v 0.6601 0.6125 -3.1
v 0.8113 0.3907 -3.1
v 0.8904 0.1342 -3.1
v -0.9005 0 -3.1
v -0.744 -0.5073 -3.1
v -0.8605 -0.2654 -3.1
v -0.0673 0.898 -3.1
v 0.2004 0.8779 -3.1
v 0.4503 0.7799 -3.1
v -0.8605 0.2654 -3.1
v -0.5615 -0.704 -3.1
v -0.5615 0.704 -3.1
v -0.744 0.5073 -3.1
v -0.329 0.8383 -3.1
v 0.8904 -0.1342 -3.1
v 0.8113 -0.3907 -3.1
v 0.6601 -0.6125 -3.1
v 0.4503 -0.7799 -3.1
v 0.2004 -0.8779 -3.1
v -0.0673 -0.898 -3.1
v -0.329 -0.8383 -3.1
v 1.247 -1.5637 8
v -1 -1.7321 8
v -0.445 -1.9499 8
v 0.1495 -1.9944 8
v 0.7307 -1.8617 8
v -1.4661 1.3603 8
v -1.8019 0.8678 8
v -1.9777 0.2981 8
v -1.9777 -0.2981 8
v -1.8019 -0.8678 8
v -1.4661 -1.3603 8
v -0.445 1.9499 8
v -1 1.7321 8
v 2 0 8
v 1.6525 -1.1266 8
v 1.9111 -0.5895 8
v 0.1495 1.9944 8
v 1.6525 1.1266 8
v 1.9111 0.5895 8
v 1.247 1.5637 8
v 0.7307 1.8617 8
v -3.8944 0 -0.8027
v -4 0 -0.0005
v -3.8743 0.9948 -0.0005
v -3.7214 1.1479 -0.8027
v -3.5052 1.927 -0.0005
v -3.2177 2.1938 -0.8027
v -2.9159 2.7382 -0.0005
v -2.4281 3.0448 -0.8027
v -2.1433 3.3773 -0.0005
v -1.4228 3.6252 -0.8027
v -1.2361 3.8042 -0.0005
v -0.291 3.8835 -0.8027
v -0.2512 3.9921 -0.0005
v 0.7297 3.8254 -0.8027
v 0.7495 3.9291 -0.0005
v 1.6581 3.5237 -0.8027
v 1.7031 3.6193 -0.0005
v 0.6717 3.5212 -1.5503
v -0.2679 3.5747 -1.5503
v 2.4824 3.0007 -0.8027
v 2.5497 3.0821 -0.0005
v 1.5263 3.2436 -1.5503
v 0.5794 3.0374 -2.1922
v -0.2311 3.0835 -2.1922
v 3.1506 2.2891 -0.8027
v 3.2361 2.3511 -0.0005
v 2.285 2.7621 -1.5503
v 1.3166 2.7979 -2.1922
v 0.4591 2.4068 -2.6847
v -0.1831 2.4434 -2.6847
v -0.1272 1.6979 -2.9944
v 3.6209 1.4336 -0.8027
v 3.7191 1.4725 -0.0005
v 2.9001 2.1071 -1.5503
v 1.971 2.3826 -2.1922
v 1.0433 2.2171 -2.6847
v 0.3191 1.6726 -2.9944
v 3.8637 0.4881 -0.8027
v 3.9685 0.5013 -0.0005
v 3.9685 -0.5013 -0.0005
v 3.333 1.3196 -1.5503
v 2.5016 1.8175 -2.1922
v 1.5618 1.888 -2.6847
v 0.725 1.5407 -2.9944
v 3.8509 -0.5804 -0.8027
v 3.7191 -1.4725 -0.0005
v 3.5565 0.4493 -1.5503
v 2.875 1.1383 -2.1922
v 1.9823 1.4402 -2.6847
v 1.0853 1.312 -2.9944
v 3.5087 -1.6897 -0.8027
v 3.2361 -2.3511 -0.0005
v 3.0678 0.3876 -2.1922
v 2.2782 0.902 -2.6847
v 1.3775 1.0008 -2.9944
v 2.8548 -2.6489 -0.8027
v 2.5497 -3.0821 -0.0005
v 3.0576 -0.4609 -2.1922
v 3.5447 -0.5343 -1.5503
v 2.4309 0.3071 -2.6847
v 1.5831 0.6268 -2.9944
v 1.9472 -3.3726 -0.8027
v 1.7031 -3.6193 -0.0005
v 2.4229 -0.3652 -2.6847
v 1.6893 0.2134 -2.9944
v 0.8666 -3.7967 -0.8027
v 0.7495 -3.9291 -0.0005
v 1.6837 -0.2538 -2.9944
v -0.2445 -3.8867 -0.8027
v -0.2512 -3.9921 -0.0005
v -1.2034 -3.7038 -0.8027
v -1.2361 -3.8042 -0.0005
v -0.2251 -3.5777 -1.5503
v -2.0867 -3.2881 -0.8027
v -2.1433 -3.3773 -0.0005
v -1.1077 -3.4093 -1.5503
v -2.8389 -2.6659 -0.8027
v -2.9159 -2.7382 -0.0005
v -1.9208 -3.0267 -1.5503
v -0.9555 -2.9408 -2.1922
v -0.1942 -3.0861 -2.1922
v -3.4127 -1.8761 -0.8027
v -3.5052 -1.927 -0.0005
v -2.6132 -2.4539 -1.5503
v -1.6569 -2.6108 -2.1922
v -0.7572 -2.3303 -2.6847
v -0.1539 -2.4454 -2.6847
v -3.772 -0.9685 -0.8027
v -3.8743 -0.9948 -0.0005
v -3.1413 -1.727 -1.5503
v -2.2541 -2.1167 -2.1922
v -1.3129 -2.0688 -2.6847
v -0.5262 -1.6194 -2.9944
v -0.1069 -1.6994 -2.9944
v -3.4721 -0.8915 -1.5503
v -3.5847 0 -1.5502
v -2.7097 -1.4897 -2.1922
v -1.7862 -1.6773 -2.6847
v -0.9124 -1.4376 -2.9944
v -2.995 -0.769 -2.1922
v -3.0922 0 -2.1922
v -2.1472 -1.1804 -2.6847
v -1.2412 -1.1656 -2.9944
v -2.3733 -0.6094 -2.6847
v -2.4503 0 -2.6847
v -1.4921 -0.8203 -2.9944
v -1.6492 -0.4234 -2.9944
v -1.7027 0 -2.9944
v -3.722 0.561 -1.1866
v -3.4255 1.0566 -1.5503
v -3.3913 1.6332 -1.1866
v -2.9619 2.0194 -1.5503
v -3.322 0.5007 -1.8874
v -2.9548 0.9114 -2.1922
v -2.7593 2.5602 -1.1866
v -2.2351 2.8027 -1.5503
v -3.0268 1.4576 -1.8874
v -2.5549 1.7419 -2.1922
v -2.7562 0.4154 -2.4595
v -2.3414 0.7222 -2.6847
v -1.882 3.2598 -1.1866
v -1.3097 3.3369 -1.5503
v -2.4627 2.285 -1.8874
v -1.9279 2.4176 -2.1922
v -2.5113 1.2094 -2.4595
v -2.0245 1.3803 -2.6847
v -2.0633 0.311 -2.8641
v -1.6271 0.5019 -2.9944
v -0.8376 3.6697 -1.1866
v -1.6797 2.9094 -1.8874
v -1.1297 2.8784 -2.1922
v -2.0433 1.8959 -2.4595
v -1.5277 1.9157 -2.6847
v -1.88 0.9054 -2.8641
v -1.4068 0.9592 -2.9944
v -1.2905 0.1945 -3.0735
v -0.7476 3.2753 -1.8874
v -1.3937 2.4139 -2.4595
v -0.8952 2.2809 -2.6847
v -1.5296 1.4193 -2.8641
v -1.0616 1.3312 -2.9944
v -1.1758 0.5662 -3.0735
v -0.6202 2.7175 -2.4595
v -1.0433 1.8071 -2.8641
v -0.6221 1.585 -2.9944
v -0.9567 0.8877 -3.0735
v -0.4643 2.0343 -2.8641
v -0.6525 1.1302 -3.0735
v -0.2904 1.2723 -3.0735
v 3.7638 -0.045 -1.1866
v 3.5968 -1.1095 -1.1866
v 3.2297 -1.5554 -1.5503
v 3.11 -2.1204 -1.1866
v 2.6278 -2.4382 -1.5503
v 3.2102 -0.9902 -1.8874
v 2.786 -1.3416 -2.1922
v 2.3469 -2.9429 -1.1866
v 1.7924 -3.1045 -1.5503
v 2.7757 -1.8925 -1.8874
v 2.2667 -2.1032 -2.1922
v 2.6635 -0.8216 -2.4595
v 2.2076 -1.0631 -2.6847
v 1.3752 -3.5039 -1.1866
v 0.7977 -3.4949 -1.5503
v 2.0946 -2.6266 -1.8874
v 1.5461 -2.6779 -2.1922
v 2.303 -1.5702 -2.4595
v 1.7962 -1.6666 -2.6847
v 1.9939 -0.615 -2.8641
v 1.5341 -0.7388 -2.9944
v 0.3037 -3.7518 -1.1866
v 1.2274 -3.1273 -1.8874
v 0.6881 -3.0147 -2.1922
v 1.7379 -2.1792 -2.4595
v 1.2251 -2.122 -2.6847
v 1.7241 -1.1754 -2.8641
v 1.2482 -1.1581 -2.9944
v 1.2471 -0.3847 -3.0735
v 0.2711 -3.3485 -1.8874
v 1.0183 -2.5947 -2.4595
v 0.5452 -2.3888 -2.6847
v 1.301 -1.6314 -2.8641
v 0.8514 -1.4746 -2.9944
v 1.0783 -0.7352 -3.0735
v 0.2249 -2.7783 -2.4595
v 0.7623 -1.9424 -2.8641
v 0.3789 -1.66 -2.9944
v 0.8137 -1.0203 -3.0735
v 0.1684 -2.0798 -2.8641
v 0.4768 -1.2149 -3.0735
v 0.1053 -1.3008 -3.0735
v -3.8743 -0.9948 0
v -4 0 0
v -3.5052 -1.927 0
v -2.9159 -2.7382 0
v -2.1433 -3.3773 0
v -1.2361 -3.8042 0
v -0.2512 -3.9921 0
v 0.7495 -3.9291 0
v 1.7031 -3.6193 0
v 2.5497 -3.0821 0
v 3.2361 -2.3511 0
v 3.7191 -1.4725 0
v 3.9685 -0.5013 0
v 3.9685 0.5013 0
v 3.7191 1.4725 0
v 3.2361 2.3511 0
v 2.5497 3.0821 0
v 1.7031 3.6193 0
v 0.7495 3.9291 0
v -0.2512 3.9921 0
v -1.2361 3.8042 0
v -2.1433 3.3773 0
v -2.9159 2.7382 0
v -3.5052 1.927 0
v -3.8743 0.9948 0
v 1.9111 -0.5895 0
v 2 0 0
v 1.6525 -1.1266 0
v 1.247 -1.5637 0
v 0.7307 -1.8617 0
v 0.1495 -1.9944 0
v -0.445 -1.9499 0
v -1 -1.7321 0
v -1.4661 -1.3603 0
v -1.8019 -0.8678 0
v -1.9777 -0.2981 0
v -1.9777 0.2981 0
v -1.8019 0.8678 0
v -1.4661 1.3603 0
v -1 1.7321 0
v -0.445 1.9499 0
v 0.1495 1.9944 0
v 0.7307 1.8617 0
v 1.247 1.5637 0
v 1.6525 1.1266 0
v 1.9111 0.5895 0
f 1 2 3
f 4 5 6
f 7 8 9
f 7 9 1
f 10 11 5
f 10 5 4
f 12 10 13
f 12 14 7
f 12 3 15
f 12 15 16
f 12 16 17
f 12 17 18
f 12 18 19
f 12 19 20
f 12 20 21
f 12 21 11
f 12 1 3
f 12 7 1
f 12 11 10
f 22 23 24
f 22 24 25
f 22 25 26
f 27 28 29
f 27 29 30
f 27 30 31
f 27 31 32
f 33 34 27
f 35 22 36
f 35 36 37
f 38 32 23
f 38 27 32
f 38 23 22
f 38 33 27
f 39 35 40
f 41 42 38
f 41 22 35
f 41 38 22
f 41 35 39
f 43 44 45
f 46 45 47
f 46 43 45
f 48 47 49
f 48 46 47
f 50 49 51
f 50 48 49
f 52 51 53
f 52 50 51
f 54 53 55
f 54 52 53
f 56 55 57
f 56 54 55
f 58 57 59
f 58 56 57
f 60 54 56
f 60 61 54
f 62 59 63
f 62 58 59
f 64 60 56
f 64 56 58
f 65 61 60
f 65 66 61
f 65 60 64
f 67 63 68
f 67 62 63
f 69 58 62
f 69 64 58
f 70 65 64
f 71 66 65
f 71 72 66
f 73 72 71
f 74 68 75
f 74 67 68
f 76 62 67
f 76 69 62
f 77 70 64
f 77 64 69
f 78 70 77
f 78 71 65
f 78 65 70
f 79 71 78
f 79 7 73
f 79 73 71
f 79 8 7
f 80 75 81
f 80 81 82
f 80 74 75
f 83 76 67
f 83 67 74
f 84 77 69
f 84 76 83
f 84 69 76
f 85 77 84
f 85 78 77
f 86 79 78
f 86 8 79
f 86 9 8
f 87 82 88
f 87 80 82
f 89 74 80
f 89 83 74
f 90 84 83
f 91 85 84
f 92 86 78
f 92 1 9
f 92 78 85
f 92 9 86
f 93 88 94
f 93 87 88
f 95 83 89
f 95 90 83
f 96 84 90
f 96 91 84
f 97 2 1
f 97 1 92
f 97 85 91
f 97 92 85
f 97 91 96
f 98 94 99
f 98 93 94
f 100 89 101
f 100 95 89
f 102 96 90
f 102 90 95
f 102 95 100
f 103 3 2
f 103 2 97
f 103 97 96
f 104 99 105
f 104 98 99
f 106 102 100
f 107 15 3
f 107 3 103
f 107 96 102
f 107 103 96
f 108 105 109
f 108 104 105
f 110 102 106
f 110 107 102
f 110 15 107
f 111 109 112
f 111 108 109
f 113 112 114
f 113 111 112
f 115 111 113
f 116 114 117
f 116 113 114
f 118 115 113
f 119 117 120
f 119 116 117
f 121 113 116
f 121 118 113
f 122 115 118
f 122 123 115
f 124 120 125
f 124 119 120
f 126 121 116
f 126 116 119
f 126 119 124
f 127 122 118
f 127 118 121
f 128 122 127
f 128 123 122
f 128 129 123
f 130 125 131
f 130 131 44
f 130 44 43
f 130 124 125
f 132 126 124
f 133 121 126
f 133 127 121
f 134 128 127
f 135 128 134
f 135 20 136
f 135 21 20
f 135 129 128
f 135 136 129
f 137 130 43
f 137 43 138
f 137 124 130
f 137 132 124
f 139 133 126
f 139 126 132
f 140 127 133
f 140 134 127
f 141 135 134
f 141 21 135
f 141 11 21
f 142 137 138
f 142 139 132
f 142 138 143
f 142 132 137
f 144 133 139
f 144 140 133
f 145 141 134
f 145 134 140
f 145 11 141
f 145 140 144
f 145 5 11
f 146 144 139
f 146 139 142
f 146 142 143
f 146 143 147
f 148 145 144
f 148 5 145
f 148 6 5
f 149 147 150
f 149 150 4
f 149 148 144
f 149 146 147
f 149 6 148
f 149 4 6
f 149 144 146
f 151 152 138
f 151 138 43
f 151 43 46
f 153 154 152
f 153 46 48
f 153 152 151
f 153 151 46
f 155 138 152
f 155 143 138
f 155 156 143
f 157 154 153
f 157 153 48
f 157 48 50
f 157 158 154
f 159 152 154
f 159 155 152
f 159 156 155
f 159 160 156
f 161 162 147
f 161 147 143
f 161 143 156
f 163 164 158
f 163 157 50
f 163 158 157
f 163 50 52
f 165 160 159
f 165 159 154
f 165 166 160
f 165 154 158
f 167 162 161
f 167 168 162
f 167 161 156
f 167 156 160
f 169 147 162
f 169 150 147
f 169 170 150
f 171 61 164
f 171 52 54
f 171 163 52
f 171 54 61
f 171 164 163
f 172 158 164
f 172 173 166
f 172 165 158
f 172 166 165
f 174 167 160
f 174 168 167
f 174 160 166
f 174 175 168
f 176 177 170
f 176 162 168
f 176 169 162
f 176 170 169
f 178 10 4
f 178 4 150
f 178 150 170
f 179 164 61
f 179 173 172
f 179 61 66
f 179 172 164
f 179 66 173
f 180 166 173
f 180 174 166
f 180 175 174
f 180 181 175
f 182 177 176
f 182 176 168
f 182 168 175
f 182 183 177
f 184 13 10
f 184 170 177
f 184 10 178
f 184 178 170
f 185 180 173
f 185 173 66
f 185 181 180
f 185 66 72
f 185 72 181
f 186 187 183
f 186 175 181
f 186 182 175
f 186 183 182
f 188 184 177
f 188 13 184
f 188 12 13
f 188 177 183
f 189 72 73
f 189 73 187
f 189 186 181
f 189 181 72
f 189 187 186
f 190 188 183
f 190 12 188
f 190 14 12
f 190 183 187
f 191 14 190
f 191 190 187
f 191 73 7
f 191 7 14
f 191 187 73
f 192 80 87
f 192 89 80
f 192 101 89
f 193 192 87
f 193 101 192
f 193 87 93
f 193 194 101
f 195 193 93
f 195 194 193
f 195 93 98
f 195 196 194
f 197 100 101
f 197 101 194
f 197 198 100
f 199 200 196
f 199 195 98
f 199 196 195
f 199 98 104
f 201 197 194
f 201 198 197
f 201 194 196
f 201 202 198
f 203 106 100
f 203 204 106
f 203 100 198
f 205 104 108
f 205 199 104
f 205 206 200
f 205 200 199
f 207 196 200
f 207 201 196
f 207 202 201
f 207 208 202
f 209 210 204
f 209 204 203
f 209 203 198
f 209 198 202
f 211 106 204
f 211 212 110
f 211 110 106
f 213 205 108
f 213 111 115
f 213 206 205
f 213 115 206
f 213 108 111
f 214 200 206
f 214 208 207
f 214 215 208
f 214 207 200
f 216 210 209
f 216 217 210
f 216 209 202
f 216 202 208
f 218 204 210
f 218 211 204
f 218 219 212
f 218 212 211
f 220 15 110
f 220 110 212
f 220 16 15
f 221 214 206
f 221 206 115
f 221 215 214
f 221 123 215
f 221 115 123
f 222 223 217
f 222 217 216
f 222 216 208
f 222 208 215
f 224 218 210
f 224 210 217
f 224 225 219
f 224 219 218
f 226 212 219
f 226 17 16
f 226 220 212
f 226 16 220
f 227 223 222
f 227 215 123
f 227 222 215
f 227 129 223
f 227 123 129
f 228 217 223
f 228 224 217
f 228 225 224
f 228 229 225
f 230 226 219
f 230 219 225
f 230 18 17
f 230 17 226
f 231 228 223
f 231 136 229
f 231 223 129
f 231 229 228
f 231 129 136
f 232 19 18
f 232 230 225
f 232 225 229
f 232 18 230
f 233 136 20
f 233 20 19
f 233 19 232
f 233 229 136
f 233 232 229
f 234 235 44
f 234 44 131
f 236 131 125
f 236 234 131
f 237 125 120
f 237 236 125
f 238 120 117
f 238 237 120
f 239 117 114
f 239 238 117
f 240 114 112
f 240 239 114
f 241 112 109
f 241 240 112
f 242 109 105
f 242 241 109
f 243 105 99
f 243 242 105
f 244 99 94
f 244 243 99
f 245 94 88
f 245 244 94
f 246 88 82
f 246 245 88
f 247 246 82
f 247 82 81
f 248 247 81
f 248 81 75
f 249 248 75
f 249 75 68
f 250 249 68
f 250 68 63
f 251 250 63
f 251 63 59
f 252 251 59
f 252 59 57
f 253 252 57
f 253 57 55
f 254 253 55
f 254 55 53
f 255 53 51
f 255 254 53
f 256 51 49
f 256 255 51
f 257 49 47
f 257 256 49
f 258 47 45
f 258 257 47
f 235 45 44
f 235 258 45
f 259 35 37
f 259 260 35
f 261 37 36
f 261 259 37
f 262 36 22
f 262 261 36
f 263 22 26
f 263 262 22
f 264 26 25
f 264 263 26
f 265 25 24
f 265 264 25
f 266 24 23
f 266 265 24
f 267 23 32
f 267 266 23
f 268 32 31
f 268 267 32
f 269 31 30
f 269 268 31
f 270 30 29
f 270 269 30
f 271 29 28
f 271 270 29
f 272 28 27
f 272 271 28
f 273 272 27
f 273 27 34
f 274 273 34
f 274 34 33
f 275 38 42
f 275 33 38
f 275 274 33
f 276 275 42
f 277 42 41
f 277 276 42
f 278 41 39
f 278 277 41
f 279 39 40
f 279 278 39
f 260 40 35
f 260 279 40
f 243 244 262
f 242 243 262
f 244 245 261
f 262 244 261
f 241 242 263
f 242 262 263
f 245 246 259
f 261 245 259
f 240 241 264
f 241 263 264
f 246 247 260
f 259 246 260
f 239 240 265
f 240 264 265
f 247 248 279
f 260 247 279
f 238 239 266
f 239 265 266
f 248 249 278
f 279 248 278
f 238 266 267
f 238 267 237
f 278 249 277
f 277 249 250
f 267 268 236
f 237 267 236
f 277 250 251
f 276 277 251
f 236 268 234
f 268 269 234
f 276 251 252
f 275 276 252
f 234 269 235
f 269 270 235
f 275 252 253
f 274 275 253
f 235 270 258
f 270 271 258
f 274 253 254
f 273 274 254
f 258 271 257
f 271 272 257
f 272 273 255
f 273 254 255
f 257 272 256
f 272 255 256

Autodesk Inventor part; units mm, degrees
ref_plane "YZ Plane" through (0, 0, 0) normal (1, 0, 0) x (0, 1, 0)
ref_plane "XZ Plane" through (0, 0, 0) normal (0, 1, 0) x (-1, 0, 0)
ref_plane "XY Plane" through (0, 0, 0) normal (0, 0, 1) x (1, 0, 0)
sketch "スケッチ1" plane through (0, 0, 0) normal (0, 0, 1) x (1, 0, 0)
  circle A0 centre (0, 0) radius 2
  dimension "d1" = 4
extrude "押し出し1" add sketch "スケッチ1" along normal blind 8
sketch "スケッチ2" plane through (0, 0, 0) normal (0, 0, -1) x (-1, 0, 0)
  circle A0 centre (0, 0) radius 2 projected
  circle A1 centre (0, 0) radius 4
  dimension "d4" = 8
extrude "押し出し2" add sketch "スケッチ2" along normal blind 3.1 contours A0 | A1
fillet "フィレット1" radius 3.1 1 edges at (4, 0, -3.1)
thread "ねじ1" size "M4x0.7" class "6g" standard "ANSI Metric M Profile" full length
properties part number "ネジ鍋m4,08" material "鋼、高強度、低合金"
